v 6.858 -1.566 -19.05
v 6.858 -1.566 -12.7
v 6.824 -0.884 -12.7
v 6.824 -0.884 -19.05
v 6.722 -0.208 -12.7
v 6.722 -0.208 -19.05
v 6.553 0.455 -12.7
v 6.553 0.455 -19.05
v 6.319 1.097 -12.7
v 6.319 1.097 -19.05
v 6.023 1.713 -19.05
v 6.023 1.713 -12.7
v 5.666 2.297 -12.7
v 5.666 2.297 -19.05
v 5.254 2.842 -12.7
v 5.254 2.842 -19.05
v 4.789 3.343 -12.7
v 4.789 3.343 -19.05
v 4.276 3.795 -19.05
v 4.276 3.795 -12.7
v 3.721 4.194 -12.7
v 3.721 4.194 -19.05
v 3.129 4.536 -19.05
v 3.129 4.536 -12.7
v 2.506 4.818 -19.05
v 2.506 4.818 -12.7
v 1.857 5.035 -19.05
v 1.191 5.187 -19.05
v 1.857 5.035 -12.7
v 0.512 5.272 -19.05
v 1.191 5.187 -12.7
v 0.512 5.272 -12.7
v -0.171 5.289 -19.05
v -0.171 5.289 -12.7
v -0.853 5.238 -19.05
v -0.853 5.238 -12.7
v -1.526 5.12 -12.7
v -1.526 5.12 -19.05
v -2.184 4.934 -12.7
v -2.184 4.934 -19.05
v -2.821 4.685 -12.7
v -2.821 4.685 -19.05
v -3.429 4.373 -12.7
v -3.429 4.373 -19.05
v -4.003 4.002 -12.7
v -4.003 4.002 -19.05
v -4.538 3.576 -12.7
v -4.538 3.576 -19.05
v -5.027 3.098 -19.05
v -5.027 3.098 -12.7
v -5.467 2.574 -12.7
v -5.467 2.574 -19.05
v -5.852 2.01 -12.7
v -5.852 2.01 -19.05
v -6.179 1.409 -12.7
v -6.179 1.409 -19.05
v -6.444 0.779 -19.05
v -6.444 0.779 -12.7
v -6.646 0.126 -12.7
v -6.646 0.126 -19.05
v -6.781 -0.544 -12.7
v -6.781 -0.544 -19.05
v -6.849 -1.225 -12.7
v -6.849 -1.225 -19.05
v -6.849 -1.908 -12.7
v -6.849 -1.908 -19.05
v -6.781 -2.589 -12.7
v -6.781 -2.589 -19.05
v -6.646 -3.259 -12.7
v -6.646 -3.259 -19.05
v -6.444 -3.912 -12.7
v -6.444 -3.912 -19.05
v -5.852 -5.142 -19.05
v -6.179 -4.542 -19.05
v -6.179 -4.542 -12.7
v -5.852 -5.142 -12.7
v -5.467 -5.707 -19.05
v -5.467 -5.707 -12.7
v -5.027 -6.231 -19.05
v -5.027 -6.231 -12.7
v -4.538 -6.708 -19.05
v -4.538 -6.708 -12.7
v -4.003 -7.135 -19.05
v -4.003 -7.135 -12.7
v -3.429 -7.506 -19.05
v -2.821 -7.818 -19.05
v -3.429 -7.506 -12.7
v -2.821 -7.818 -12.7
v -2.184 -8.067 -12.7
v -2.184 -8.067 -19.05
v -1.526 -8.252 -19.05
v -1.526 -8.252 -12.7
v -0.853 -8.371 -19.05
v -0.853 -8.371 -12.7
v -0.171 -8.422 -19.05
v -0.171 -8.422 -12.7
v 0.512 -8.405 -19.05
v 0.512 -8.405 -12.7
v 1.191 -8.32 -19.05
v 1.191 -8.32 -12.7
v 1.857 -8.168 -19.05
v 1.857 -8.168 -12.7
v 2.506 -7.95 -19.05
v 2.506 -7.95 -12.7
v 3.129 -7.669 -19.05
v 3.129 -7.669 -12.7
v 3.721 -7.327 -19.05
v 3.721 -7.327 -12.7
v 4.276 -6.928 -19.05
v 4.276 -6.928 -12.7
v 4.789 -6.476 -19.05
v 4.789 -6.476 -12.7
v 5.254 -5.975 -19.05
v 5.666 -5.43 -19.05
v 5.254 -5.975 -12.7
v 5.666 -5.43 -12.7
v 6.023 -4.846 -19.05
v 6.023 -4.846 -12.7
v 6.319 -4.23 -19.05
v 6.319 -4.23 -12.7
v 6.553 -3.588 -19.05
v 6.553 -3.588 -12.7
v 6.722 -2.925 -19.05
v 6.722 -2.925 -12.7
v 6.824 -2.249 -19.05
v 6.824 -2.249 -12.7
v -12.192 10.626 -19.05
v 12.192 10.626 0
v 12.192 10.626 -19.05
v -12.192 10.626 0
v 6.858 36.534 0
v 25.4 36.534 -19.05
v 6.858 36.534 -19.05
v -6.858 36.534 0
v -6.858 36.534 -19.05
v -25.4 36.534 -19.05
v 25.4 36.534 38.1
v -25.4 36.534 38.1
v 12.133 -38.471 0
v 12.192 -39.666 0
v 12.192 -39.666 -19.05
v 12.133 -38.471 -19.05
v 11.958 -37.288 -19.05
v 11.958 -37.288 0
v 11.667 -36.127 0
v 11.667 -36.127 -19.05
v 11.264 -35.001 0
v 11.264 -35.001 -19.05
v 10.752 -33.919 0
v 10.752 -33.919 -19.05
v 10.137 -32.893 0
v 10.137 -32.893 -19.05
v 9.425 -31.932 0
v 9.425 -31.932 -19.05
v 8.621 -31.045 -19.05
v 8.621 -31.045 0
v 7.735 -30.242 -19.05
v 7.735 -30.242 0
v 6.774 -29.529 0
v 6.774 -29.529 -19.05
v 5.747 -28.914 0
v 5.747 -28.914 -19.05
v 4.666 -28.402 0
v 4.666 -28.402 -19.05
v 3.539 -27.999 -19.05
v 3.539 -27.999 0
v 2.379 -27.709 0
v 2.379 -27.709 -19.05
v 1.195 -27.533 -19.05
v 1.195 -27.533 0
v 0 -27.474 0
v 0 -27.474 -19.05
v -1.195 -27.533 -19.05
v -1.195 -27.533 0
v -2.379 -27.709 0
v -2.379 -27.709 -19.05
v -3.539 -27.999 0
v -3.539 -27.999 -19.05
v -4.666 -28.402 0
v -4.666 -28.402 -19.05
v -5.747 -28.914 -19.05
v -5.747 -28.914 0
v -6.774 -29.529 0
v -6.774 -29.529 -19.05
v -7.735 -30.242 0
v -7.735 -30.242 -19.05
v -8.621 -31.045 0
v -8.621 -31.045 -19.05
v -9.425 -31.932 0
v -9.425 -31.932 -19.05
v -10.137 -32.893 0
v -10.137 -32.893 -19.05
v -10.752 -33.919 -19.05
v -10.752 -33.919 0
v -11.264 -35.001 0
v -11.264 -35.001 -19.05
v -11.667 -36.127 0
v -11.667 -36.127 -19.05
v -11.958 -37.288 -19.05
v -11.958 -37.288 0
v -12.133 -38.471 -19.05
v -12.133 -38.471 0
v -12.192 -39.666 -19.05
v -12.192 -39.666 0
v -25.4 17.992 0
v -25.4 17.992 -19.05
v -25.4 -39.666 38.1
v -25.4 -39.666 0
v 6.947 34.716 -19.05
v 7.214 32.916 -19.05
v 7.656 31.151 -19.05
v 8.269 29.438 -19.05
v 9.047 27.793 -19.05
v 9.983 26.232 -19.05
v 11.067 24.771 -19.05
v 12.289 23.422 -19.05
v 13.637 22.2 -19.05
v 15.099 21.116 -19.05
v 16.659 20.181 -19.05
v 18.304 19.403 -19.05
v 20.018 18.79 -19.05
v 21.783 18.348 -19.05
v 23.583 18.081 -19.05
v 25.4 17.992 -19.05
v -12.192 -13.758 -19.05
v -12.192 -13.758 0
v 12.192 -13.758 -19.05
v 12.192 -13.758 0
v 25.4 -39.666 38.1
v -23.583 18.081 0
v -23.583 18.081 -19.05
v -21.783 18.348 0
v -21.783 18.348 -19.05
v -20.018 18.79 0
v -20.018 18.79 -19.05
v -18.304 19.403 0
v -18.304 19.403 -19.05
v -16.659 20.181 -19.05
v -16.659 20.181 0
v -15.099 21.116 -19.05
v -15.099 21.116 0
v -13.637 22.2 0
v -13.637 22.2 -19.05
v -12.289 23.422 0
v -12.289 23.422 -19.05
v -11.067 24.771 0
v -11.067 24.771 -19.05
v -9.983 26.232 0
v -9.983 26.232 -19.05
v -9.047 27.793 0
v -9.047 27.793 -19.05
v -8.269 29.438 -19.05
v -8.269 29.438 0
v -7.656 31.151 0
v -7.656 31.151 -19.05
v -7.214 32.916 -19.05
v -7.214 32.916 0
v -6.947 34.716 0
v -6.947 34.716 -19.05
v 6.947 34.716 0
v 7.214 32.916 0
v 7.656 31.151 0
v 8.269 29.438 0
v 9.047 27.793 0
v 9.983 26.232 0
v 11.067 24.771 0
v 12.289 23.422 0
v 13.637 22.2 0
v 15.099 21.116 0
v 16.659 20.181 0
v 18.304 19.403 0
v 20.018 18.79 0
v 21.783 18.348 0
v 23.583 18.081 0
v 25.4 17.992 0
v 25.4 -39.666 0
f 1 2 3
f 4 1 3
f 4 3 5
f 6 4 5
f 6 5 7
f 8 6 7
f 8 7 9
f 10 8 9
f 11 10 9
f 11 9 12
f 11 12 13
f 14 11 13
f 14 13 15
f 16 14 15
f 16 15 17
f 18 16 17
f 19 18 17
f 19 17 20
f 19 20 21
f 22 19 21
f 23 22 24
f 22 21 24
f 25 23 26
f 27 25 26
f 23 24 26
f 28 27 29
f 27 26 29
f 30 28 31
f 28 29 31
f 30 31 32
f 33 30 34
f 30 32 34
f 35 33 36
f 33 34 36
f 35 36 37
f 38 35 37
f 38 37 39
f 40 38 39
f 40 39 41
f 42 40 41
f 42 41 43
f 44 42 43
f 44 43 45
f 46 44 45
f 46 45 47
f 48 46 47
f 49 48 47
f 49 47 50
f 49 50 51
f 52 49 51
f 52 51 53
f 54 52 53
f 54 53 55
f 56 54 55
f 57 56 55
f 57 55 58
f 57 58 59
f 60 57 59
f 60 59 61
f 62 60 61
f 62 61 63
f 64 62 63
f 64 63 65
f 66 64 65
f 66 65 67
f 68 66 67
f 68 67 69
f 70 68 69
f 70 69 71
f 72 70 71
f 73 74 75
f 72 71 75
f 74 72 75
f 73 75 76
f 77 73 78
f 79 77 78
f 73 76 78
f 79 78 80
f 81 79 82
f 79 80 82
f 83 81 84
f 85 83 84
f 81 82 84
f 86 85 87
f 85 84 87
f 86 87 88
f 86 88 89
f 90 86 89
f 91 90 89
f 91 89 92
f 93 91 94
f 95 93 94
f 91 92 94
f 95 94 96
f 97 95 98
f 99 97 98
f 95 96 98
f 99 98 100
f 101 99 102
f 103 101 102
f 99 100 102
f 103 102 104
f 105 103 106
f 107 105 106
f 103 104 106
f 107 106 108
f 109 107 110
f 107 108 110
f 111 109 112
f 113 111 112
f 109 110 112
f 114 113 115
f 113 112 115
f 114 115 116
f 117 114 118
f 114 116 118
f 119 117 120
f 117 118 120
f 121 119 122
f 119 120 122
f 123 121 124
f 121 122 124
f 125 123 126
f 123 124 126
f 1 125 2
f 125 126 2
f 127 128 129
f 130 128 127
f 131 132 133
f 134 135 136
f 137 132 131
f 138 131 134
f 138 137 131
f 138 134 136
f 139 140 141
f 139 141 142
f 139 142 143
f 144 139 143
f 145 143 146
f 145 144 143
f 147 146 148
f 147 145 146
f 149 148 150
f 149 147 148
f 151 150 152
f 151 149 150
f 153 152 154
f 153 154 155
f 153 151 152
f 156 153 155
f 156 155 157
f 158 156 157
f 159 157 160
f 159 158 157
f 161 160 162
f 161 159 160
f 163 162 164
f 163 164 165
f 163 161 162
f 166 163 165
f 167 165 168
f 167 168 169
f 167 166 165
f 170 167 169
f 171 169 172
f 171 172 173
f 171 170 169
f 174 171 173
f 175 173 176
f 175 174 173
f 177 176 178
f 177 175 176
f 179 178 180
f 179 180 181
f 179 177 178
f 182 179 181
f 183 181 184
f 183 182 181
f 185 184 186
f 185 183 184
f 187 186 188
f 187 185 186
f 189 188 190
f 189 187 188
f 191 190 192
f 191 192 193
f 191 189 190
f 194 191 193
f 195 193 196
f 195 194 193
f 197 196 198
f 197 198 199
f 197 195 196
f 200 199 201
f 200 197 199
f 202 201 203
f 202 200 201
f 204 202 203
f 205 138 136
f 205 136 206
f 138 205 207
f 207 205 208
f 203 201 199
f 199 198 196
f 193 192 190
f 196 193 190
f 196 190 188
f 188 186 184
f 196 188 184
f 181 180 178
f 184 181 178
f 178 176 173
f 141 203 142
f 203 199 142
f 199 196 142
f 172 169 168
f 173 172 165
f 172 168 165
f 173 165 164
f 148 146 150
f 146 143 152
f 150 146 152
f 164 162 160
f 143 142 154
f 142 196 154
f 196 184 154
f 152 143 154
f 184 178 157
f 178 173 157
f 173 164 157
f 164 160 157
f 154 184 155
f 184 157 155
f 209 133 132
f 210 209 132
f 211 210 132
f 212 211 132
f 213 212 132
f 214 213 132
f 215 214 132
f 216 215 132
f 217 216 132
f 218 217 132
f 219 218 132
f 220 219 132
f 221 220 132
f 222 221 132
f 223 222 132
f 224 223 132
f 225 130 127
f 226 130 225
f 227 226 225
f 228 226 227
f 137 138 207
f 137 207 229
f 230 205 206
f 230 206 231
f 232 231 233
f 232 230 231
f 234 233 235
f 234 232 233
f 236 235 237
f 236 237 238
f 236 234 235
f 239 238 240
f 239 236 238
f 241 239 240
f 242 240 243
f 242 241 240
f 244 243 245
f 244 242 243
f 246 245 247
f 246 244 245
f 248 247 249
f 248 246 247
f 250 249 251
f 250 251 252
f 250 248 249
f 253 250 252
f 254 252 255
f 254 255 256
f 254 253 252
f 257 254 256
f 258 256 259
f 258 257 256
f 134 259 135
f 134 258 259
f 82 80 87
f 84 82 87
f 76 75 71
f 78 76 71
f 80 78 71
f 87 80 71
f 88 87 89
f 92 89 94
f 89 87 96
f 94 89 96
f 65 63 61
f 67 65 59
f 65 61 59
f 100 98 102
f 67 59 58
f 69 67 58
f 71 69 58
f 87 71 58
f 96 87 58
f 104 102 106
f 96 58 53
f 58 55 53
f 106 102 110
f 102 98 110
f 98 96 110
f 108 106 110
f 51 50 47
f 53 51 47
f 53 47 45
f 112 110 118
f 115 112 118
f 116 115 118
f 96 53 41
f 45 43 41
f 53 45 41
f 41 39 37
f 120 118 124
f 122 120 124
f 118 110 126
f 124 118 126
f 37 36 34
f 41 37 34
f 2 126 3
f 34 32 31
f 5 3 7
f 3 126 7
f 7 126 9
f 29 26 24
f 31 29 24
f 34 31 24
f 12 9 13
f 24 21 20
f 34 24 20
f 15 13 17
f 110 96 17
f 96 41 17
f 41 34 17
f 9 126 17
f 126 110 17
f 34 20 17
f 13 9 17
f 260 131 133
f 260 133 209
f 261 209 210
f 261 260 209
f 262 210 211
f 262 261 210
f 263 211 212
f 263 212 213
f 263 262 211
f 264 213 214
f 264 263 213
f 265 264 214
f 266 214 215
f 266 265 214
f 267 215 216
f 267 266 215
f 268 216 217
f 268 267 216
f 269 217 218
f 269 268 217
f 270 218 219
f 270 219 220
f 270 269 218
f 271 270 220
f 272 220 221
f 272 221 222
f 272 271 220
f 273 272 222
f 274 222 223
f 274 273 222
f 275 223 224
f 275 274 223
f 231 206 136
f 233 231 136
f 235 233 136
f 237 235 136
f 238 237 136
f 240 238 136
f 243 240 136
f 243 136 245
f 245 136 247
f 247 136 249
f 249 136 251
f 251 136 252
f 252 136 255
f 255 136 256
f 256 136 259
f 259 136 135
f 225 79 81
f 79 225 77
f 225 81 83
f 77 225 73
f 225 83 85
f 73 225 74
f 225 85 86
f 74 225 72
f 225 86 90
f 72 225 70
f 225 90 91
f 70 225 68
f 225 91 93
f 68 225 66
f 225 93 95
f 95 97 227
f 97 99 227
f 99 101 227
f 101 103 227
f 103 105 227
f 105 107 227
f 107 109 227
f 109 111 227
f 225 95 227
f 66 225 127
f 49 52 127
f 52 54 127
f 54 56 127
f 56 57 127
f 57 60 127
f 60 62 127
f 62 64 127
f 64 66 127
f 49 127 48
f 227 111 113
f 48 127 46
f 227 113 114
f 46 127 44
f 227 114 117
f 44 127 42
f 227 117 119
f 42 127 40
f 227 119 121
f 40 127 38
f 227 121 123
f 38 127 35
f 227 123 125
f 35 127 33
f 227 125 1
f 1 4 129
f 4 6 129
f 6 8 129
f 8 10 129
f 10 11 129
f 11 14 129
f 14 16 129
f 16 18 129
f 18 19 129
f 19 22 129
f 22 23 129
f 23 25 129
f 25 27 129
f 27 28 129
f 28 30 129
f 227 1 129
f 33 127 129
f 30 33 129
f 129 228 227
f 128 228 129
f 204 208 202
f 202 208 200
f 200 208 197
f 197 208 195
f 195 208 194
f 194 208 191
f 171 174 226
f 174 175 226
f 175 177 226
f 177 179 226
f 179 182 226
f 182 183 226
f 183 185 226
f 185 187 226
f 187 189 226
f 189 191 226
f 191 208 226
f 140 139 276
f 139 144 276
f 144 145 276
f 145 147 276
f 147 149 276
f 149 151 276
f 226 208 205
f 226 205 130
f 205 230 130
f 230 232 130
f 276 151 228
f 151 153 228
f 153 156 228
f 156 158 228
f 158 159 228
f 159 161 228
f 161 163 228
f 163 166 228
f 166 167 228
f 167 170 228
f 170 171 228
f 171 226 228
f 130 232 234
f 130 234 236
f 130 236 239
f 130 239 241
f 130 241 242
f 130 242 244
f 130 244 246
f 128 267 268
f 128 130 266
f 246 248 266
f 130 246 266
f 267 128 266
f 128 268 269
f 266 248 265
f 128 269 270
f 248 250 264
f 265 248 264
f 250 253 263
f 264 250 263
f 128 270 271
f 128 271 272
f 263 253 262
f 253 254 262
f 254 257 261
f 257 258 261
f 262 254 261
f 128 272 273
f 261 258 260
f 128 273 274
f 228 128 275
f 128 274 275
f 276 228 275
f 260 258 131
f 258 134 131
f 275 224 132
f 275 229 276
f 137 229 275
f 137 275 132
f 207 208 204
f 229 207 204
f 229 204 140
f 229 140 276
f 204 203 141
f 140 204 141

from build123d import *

# Parameters (mm, degrees)
F0_R     = 6.858
F1_DEPTH = 38.1
F2_DEPTH = 19.05
F3_DEPTH = 12.7


with BuildPart() as f1:
    # F0 (on Top) → F1 (new body)
    with BuildSketch(Plane.XY):
        with BuildLine():
            ThreePointArc((25.4, 17.991581587), (12.2888260632, 23.4224076502), (6.858, 36.533581587))
            Line((6.858, 36.533581587), (-6.858, 36.533581587))
            ThreePointArc((-6.858, 36.533581587), (-12.2888260632, 23.4224076502), (-25.4, 17.991581587))
            Line((-25.4, 17.991581587), (-25.4, -39.666418413))
            Line((-25.4, -39.666418413), (-12.192, -39.666418413))
            ThreePointArc((-12.192, -39.666418413), (0, -27.474418413), (12.192, -39.666418413))
            Line((12.192, -39.666418413), (25.4, -39.666418413))
            Line((25.4, -39.666418413), (25.4, 17.991581587))
        make_face()
        Polygon((-12.192, 10.625581587), (12.192, 10.625581587), (12.192, 0), (12.192, -13.758418413), (-12.192, -13.758418413), (-12.192, 0), align=None, mode=Mode.SUBTRACT)
        Polygon((12.192, 0), (12.192, 10.625581587), (-12.192, 10.625581587), (-12.192, 0), (-12.192, -13.758418413), (12.192, -13.758418413), align=None)
        with Locations((0, -1.566418413)):
            Circle(F0_R, mode=Mode.SUBTRACT)
        with BuildLine():
            Line((25.4, 17.991581587), (25.4, 36.533581587))
            Line((25.4, 36.533581587), (6.858, 36.533581587))
            ThreePointArc((6.858, 36.533581587), (12.2888260632, 23.4224076502), (25.4, 17.991581587))
        make_face()
        with BuildLine():
            ThreePointArc((-25.4, 17.991581587), (-12.2888260632, 23.4224076502), (-6.858, 36.533581587))
            Line((-6.858, 36.533581587), (-25.4, 36.533581587))
            Line((-25.4, 36.533581587), (-25.4, 17.991581587))
        make_face()
        with BuildLine():
            Line((-12.192, -39.666418413), (12.192, -39.666418413))
            ThreePointArc((12.192, -39.666418413), (0, -27.474418413), (-12.192, -39.666418413))
        make_face()
        with Locations((0, -1.566418413)):
            Circle(F0_R)
    extrude(amount=F1_DEPTH)

    # F0 (on Top) → F2 (join)
    with BuildSketch(Plane.XY):
        with BuildLine():
            Line((-12.192, -39.666418413), (12.192, -39.666418413))
            ThreePointArc((12.192, -39.666418413), (0, -27.474418413), (-12.192, -39.666418413))
        make_face()
        Polygon((12.192, 0), (12.192, 10.625581587), (-12.192, 10.625581587), (-12.192, 0), (-12.192, -13.758418413), (12.192, -13.758418413), align=None)
        with Locations((0, -1.566418413)):
            Circle(F0_R, mode=Mode.SUBTRACT)
        with BuildLine():
            Line((25.4, 17.991581587), (25.4, 36.533581587))
            Line((25.4, 36.533581587), (6.858, 36.533581587))
            ThreePointArc((6.858, 36.533581587), (12.2888260632, 23.4224076502), (25.4, 17.991581587))
        make_face()
        with BuildLine():
            ThreePointArc((-25.4, 17.991581587), (-12.2888260632, 23.4224076502), (-6.858, 36.533581587))
            Line((-6.858, 36.533581587), (-25.4, 36.533581587))
            Line((-25.4, 36.533581587), (-25.4, 17.991581587))
        make_face()
    extrude(amount=-F2_DEPTH)

    # F0 (on Top) → F3 (join)
    with BuildSketch(Plane.XY):
        with Locations((0, -1.566418413)):
            Circle(F0_R)
    extrude(amount=-F3_DEPTH)


solid = f1.part
